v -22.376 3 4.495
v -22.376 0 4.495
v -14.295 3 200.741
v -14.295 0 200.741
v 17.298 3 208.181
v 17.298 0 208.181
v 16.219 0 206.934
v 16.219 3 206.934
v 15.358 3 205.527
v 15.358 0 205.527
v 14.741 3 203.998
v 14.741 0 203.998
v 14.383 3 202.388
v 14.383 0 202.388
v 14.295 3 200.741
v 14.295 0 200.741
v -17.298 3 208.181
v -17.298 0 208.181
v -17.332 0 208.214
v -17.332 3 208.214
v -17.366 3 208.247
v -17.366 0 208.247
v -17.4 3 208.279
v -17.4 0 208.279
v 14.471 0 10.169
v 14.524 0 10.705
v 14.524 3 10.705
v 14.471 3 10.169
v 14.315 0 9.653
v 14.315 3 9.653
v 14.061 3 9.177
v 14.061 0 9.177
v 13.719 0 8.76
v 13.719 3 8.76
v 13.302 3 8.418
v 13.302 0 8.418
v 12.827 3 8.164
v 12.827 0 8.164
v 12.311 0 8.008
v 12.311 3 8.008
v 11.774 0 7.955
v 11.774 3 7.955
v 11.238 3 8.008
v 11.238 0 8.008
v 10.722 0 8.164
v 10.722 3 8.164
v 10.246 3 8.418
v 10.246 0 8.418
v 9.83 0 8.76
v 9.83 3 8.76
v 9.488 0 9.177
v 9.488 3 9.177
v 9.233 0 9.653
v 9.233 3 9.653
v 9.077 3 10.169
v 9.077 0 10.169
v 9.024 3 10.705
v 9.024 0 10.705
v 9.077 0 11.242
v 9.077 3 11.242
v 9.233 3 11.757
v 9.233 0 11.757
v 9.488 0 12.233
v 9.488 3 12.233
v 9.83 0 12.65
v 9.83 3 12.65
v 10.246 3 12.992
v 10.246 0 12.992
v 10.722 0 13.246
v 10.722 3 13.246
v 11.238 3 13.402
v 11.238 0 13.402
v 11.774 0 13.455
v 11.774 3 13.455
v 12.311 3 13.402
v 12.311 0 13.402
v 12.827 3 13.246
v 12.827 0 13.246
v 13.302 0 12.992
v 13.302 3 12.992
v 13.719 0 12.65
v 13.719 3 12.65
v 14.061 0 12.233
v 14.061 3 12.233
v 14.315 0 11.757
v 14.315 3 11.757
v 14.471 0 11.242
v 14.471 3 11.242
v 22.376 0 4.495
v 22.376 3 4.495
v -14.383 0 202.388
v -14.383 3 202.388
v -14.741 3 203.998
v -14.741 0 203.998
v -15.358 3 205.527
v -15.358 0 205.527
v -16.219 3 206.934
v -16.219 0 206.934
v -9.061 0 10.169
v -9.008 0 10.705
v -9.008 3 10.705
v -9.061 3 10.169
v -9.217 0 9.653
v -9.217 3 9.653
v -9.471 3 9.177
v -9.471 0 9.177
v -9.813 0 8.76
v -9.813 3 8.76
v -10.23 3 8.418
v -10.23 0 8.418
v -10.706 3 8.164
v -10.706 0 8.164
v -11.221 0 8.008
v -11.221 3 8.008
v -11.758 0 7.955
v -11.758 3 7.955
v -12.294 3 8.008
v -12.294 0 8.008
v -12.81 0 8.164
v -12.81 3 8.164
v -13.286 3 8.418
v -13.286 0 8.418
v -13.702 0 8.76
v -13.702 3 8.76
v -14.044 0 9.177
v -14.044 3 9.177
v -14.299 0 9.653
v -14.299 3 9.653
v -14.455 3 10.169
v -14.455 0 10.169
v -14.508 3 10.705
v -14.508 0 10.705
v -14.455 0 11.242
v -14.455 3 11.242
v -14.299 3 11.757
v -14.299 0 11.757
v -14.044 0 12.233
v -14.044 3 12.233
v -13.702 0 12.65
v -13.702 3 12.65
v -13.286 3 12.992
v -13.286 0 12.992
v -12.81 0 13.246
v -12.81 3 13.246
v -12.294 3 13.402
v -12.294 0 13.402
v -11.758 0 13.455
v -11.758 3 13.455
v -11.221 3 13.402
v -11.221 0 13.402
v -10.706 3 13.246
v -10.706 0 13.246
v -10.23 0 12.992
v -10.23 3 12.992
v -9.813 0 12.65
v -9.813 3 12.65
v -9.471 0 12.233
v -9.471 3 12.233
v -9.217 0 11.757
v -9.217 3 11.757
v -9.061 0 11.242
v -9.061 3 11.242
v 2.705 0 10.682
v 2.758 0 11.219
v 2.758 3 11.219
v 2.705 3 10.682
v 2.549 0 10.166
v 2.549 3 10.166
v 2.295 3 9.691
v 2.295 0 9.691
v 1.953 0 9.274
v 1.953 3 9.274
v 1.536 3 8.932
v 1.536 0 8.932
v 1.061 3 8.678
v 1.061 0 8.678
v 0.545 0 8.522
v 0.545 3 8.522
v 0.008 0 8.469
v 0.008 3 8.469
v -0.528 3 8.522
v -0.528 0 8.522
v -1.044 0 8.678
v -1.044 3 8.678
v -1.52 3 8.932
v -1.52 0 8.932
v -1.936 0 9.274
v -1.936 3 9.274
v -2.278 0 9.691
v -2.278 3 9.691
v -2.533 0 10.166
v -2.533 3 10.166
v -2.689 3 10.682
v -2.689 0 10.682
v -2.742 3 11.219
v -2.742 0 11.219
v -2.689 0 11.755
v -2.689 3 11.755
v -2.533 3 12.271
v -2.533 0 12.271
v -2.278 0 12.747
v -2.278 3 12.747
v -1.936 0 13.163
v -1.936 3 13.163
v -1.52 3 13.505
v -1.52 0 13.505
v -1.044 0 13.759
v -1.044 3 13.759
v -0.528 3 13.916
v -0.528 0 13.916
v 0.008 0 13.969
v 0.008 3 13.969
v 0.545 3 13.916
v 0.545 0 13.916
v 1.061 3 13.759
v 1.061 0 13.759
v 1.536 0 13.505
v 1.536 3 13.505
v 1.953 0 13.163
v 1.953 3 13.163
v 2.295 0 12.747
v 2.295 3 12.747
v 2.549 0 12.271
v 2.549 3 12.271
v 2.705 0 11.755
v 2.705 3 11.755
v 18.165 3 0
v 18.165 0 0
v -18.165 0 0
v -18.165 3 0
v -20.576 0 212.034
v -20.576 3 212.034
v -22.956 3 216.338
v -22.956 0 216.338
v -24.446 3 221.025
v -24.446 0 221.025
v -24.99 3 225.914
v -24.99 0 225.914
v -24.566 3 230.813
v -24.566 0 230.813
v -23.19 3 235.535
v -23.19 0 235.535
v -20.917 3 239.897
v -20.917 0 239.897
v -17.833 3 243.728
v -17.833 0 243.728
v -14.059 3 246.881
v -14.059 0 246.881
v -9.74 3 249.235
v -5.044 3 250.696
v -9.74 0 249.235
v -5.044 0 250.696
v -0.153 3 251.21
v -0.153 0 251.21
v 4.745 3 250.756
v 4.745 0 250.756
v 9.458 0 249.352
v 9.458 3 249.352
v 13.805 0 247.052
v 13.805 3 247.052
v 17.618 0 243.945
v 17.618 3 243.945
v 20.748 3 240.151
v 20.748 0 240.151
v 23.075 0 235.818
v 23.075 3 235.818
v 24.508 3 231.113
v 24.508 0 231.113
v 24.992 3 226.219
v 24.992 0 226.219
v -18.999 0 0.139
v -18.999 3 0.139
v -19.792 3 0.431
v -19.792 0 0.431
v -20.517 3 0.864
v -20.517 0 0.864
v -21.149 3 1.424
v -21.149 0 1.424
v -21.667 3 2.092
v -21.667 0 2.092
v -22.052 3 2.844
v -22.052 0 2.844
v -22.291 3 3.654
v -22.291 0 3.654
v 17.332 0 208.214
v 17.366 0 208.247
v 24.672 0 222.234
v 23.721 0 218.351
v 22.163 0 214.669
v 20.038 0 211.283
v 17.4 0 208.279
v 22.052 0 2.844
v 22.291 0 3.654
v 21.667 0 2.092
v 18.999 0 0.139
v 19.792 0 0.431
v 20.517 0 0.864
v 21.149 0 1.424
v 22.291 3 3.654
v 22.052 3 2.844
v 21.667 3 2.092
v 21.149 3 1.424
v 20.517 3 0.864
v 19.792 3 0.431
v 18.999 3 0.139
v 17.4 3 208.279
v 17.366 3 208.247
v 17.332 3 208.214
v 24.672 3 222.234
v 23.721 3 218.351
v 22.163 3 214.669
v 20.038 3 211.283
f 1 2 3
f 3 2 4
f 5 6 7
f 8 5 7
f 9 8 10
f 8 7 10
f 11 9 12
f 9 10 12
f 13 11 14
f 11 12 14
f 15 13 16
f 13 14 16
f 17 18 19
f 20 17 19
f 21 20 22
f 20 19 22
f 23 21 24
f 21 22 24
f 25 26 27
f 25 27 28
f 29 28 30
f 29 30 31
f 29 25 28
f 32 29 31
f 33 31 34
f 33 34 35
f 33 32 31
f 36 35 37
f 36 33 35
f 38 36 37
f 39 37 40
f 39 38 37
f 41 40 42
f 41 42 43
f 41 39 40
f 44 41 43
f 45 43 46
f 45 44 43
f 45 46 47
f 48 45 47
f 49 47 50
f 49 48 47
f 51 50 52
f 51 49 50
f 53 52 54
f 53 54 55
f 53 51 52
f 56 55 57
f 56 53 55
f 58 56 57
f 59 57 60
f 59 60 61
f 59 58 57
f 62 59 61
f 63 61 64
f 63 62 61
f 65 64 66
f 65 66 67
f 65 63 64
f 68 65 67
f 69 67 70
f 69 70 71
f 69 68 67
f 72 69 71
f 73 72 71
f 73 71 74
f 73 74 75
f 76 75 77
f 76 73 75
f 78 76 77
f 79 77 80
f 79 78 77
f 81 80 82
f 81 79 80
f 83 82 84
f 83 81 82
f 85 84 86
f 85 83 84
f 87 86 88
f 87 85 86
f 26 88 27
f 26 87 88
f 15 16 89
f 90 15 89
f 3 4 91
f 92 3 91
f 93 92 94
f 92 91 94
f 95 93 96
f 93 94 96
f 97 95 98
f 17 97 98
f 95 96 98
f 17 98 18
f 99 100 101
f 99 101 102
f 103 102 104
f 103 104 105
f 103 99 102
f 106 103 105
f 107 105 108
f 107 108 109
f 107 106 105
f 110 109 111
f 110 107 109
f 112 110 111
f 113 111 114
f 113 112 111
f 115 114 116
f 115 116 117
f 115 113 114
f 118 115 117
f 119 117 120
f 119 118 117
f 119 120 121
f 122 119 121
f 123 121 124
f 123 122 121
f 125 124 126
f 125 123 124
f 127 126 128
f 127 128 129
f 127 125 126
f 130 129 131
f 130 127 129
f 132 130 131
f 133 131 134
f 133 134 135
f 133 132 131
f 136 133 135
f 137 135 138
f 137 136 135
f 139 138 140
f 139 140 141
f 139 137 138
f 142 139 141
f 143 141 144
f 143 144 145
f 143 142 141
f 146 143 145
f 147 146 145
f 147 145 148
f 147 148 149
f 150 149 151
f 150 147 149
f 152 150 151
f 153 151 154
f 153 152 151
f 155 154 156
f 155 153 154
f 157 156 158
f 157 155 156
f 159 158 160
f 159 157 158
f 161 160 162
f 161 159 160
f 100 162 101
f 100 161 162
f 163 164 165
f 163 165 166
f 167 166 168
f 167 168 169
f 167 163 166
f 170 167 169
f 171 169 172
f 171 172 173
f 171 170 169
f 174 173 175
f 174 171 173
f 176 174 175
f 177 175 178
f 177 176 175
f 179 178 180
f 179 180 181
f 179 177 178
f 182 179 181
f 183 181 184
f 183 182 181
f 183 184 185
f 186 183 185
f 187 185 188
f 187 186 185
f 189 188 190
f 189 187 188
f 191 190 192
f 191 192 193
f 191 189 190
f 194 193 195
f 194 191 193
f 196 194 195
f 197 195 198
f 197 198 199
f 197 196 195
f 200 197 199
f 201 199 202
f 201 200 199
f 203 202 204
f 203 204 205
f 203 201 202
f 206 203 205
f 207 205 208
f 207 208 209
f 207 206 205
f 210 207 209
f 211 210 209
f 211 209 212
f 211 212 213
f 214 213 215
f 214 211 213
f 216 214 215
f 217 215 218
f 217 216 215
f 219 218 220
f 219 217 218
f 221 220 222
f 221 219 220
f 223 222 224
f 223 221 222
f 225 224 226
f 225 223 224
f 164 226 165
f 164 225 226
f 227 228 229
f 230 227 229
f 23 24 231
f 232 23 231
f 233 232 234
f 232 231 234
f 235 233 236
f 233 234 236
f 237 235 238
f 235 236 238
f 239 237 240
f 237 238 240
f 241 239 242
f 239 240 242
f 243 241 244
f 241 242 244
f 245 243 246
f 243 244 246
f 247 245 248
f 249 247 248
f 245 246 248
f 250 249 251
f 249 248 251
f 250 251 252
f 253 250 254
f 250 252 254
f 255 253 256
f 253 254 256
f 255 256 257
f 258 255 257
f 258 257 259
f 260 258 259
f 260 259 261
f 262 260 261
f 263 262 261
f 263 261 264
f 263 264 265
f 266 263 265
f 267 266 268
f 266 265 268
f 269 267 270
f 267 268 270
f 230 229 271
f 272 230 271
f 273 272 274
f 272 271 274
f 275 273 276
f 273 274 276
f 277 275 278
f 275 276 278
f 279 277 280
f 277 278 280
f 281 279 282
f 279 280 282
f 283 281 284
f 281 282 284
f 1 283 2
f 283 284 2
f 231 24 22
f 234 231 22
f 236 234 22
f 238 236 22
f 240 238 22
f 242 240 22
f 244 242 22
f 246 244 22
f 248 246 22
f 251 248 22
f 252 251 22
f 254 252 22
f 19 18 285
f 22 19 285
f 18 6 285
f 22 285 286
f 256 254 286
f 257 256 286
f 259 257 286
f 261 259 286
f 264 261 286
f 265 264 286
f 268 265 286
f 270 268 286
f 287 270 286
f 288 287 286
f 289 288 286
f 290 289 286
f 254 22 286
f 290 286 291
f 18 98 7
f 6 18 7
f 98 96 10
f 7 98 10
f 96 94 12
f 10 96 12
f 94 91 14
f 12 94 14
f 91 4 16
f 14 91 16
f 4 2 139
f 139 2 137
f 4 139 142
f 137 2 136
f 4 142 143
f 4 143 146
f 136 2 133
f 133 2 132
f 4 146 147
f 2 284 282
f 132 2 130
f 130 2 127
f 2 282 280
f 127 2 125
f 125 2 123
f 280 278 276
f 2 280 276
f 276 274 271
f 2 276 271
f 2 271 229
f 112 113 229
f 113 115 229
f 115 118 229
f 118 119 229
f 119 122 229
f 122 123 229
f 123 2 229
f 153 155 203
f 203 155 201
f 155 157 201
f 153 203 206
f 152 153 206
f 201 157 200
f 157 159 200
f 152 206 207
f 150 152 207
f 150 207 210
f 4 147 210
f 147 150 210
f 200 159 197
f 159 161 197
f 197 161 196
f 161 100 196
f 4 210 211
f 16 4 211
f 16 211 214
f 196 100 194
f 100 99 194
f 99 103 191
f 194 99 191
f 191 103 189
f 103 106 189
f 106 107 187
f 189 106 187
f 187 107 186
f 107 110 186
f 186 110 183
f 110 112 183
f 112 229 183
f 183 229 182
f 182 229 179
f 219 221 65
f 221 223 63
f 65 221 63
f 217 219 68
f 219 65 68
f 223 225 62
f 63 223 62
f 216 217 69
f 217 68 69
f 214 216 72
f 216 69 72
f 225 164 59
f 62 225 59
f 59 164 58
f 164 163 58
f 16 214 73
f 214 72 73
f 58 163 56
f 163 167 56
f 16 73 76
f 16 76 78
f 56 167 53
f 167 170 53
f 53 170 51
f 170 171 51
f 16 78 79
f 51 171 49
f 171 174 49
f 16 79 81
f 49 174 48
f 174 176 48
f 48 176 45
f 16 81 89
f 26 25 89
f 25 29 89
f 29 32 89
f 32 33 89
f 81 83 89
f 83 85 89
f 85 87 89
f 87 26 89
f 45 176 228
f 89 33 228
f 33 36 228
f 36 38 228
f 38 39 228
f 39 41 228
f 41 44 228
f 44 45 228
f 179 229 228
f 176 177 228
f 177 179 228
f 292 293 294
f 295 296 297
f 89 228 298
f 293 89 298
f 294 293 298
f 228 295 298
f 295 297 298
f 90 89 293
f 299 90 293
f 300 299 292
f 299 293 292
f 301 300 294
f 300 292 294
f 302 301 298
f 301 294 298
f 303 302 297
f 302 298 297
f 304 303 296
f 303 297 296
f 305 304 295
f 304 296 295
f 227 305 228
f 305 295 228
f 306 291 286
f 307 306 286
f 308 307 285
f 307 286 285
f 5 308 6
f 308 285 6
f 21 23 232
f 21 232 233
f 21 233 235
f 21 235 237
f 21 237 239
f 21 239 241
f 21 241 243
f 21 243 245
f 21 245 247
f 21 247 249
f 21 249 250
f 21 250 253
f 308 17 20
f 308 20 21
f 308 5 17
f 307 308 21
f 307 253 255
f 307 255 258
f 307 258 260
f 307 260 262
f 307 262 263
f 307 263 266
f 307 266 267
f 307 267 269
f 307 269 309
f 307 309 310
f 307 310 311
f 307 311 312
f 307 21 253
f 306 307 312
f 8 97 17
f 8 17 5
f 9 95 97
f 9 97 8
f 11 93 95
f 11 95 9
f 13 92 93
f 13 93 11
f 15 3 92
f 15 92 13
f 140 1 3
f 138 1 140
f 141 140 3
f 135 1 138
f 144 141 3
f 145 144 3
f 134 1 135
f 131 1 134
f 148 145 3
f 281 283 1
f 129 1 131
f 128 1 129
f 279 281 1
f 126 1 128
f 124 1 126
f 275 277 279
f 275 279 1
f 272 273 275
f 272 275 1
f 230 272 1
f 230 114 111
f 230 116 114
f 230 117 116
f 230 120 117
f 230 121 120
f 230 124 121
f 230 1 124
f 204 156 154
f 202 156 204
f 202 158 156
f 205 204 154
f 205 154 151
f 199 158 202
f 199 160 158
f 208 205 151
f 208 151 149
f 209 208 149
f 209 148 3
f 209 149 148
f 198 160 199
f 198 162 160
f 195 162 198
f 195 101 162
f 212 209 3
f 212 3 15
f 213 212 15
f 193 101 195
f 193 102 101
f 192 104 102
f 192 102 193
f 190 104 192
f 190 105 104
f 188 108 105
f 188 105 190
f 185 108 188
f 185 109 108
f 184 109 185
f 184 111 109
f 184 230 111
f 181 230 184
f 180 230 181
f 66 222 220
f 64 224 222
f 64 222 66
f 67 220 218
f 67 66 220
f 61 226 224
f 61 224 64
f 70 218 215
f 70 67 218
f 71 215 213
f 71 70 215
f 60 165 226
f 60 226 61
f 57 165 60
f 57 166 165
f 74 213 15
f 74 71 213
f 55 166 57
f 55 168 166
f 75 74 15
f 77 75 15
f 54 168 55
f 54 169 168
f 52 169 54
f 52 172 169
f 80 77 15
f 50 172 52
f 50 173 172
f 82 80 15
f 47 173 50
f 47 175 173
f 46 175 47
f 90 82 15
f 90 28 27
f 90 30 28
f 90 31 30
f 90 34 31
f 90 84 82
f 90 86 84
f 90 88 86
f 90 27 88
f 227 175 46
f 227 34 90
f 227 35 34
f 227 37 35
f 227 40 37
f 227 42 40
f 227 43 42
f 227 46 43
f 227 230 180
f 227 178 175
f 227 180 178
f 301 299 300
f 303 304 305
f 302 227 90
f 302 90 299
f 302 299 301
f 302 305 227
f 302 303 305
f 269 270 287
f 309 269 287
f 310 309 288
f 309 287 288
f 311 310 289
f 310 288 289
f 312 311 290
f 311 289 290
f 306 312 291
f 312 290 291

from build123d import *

# Parameters (mm, degrees)
SKETCH1_R           = 2.75
SKETCH1_R_2         = 15
SKETCH1_R_3         = 5
BOSS_EXTRUDE3_DEPTH = 3


with BuildPart() as part:
    # Sketch1 → Boss-Extrude3 (new body)
    with BuildSketch(Plane(origin=(0, 0, 0), x_dir=(1, 0, 0), z_dir=(0, 1, 0))):
        with BuildLine():
            Line((-17.506658739, 0), (-18.165165803, 0))
            ThreePointArc((-18.165165803, 0), (-21.149463035, -1.424316358), (-22.376192782, -4.495121005))
            Line((-22.376192782, -4.495121005), (-14.295317192, -200.74104694))
            ThreePointArc((-14.295317192, -200.74104694), (-15.017989675, -204.775435104), (-17.298404685, -208.181055571))
            ThreePointArc((-17.298404685, -208.181055571), (0, -201.226886238), (17.298404685, -208.181055571))
            ThreePointArc((17.298404685, -208.181055571), (15.017989675, -204.775435104), (14.295317192, -200.74104694))
            Line((14.295317192, -200.74104694), (22.376192782, -4.495121005))
            ThreePointArc((22.376192782, -4.495121005), (21.149463035, -1.424316358), (18.165165803, 0))
            Line((18.165165803, 0), (17.506658739, 0))
            Line((17.506658739, 0), (-17.506658739, 0))
        make_face()
        with Locations((-11.757886925, -10.70503214)):
            Circle(SKETCH1_R, mode=Mode.SUBTRACT)
        with Locations((0.008138346, -11.218747897)):
            Circle(SKETCH1_R, mode=Mode.SUBTRACT)
        with Locations((11.774163618, -10.70503214)):
            Circle(SKETCH1_R, mode=Mode.SUBTRACT)
        with BuildLine():
            ThreePointArc((17.298404685, -208.181055571), (0, -201.226886238), (-17.298404685, -208.181055571))
            ThreePointArc((-17.298404685, -208.181055571), (-17.349081254, -208.230277568), (-17.400104292, -208.279140328))
            ThreePointArc((-17.400104292, -208.279140328), (-9.739921707, -249.234548423), (24.991861654, -226.218747892))
            ThreePointArc((24.991861654, -226.218747892), (23.015800531, -216.478826185), (17.400104292, -208.279140328))
            ThreePointArc((17.400104292, -208.279140328), (17.349081254, -208.230277568), (17.298404685, -208.181055571))
        make_face()
        with Locations((0, -226.218747892)):
            Circle(SKETCH1_R_2, mode=Mode.SUBTRACT)
        with Locations((0, -226.218747892)):
            Circle(SKETCH1_R_2)
        with Locations((0, -226.218747892)):
            Circle(SKETCH1_R_3, mode=Mode.SUBTRACT)
        with Locations((0, -226.218747892)):
            Circle(SKETCH1_R_3)
    extrude(amount=BOSS_EXTRUDE3_DEPTH)


solid = part.part
